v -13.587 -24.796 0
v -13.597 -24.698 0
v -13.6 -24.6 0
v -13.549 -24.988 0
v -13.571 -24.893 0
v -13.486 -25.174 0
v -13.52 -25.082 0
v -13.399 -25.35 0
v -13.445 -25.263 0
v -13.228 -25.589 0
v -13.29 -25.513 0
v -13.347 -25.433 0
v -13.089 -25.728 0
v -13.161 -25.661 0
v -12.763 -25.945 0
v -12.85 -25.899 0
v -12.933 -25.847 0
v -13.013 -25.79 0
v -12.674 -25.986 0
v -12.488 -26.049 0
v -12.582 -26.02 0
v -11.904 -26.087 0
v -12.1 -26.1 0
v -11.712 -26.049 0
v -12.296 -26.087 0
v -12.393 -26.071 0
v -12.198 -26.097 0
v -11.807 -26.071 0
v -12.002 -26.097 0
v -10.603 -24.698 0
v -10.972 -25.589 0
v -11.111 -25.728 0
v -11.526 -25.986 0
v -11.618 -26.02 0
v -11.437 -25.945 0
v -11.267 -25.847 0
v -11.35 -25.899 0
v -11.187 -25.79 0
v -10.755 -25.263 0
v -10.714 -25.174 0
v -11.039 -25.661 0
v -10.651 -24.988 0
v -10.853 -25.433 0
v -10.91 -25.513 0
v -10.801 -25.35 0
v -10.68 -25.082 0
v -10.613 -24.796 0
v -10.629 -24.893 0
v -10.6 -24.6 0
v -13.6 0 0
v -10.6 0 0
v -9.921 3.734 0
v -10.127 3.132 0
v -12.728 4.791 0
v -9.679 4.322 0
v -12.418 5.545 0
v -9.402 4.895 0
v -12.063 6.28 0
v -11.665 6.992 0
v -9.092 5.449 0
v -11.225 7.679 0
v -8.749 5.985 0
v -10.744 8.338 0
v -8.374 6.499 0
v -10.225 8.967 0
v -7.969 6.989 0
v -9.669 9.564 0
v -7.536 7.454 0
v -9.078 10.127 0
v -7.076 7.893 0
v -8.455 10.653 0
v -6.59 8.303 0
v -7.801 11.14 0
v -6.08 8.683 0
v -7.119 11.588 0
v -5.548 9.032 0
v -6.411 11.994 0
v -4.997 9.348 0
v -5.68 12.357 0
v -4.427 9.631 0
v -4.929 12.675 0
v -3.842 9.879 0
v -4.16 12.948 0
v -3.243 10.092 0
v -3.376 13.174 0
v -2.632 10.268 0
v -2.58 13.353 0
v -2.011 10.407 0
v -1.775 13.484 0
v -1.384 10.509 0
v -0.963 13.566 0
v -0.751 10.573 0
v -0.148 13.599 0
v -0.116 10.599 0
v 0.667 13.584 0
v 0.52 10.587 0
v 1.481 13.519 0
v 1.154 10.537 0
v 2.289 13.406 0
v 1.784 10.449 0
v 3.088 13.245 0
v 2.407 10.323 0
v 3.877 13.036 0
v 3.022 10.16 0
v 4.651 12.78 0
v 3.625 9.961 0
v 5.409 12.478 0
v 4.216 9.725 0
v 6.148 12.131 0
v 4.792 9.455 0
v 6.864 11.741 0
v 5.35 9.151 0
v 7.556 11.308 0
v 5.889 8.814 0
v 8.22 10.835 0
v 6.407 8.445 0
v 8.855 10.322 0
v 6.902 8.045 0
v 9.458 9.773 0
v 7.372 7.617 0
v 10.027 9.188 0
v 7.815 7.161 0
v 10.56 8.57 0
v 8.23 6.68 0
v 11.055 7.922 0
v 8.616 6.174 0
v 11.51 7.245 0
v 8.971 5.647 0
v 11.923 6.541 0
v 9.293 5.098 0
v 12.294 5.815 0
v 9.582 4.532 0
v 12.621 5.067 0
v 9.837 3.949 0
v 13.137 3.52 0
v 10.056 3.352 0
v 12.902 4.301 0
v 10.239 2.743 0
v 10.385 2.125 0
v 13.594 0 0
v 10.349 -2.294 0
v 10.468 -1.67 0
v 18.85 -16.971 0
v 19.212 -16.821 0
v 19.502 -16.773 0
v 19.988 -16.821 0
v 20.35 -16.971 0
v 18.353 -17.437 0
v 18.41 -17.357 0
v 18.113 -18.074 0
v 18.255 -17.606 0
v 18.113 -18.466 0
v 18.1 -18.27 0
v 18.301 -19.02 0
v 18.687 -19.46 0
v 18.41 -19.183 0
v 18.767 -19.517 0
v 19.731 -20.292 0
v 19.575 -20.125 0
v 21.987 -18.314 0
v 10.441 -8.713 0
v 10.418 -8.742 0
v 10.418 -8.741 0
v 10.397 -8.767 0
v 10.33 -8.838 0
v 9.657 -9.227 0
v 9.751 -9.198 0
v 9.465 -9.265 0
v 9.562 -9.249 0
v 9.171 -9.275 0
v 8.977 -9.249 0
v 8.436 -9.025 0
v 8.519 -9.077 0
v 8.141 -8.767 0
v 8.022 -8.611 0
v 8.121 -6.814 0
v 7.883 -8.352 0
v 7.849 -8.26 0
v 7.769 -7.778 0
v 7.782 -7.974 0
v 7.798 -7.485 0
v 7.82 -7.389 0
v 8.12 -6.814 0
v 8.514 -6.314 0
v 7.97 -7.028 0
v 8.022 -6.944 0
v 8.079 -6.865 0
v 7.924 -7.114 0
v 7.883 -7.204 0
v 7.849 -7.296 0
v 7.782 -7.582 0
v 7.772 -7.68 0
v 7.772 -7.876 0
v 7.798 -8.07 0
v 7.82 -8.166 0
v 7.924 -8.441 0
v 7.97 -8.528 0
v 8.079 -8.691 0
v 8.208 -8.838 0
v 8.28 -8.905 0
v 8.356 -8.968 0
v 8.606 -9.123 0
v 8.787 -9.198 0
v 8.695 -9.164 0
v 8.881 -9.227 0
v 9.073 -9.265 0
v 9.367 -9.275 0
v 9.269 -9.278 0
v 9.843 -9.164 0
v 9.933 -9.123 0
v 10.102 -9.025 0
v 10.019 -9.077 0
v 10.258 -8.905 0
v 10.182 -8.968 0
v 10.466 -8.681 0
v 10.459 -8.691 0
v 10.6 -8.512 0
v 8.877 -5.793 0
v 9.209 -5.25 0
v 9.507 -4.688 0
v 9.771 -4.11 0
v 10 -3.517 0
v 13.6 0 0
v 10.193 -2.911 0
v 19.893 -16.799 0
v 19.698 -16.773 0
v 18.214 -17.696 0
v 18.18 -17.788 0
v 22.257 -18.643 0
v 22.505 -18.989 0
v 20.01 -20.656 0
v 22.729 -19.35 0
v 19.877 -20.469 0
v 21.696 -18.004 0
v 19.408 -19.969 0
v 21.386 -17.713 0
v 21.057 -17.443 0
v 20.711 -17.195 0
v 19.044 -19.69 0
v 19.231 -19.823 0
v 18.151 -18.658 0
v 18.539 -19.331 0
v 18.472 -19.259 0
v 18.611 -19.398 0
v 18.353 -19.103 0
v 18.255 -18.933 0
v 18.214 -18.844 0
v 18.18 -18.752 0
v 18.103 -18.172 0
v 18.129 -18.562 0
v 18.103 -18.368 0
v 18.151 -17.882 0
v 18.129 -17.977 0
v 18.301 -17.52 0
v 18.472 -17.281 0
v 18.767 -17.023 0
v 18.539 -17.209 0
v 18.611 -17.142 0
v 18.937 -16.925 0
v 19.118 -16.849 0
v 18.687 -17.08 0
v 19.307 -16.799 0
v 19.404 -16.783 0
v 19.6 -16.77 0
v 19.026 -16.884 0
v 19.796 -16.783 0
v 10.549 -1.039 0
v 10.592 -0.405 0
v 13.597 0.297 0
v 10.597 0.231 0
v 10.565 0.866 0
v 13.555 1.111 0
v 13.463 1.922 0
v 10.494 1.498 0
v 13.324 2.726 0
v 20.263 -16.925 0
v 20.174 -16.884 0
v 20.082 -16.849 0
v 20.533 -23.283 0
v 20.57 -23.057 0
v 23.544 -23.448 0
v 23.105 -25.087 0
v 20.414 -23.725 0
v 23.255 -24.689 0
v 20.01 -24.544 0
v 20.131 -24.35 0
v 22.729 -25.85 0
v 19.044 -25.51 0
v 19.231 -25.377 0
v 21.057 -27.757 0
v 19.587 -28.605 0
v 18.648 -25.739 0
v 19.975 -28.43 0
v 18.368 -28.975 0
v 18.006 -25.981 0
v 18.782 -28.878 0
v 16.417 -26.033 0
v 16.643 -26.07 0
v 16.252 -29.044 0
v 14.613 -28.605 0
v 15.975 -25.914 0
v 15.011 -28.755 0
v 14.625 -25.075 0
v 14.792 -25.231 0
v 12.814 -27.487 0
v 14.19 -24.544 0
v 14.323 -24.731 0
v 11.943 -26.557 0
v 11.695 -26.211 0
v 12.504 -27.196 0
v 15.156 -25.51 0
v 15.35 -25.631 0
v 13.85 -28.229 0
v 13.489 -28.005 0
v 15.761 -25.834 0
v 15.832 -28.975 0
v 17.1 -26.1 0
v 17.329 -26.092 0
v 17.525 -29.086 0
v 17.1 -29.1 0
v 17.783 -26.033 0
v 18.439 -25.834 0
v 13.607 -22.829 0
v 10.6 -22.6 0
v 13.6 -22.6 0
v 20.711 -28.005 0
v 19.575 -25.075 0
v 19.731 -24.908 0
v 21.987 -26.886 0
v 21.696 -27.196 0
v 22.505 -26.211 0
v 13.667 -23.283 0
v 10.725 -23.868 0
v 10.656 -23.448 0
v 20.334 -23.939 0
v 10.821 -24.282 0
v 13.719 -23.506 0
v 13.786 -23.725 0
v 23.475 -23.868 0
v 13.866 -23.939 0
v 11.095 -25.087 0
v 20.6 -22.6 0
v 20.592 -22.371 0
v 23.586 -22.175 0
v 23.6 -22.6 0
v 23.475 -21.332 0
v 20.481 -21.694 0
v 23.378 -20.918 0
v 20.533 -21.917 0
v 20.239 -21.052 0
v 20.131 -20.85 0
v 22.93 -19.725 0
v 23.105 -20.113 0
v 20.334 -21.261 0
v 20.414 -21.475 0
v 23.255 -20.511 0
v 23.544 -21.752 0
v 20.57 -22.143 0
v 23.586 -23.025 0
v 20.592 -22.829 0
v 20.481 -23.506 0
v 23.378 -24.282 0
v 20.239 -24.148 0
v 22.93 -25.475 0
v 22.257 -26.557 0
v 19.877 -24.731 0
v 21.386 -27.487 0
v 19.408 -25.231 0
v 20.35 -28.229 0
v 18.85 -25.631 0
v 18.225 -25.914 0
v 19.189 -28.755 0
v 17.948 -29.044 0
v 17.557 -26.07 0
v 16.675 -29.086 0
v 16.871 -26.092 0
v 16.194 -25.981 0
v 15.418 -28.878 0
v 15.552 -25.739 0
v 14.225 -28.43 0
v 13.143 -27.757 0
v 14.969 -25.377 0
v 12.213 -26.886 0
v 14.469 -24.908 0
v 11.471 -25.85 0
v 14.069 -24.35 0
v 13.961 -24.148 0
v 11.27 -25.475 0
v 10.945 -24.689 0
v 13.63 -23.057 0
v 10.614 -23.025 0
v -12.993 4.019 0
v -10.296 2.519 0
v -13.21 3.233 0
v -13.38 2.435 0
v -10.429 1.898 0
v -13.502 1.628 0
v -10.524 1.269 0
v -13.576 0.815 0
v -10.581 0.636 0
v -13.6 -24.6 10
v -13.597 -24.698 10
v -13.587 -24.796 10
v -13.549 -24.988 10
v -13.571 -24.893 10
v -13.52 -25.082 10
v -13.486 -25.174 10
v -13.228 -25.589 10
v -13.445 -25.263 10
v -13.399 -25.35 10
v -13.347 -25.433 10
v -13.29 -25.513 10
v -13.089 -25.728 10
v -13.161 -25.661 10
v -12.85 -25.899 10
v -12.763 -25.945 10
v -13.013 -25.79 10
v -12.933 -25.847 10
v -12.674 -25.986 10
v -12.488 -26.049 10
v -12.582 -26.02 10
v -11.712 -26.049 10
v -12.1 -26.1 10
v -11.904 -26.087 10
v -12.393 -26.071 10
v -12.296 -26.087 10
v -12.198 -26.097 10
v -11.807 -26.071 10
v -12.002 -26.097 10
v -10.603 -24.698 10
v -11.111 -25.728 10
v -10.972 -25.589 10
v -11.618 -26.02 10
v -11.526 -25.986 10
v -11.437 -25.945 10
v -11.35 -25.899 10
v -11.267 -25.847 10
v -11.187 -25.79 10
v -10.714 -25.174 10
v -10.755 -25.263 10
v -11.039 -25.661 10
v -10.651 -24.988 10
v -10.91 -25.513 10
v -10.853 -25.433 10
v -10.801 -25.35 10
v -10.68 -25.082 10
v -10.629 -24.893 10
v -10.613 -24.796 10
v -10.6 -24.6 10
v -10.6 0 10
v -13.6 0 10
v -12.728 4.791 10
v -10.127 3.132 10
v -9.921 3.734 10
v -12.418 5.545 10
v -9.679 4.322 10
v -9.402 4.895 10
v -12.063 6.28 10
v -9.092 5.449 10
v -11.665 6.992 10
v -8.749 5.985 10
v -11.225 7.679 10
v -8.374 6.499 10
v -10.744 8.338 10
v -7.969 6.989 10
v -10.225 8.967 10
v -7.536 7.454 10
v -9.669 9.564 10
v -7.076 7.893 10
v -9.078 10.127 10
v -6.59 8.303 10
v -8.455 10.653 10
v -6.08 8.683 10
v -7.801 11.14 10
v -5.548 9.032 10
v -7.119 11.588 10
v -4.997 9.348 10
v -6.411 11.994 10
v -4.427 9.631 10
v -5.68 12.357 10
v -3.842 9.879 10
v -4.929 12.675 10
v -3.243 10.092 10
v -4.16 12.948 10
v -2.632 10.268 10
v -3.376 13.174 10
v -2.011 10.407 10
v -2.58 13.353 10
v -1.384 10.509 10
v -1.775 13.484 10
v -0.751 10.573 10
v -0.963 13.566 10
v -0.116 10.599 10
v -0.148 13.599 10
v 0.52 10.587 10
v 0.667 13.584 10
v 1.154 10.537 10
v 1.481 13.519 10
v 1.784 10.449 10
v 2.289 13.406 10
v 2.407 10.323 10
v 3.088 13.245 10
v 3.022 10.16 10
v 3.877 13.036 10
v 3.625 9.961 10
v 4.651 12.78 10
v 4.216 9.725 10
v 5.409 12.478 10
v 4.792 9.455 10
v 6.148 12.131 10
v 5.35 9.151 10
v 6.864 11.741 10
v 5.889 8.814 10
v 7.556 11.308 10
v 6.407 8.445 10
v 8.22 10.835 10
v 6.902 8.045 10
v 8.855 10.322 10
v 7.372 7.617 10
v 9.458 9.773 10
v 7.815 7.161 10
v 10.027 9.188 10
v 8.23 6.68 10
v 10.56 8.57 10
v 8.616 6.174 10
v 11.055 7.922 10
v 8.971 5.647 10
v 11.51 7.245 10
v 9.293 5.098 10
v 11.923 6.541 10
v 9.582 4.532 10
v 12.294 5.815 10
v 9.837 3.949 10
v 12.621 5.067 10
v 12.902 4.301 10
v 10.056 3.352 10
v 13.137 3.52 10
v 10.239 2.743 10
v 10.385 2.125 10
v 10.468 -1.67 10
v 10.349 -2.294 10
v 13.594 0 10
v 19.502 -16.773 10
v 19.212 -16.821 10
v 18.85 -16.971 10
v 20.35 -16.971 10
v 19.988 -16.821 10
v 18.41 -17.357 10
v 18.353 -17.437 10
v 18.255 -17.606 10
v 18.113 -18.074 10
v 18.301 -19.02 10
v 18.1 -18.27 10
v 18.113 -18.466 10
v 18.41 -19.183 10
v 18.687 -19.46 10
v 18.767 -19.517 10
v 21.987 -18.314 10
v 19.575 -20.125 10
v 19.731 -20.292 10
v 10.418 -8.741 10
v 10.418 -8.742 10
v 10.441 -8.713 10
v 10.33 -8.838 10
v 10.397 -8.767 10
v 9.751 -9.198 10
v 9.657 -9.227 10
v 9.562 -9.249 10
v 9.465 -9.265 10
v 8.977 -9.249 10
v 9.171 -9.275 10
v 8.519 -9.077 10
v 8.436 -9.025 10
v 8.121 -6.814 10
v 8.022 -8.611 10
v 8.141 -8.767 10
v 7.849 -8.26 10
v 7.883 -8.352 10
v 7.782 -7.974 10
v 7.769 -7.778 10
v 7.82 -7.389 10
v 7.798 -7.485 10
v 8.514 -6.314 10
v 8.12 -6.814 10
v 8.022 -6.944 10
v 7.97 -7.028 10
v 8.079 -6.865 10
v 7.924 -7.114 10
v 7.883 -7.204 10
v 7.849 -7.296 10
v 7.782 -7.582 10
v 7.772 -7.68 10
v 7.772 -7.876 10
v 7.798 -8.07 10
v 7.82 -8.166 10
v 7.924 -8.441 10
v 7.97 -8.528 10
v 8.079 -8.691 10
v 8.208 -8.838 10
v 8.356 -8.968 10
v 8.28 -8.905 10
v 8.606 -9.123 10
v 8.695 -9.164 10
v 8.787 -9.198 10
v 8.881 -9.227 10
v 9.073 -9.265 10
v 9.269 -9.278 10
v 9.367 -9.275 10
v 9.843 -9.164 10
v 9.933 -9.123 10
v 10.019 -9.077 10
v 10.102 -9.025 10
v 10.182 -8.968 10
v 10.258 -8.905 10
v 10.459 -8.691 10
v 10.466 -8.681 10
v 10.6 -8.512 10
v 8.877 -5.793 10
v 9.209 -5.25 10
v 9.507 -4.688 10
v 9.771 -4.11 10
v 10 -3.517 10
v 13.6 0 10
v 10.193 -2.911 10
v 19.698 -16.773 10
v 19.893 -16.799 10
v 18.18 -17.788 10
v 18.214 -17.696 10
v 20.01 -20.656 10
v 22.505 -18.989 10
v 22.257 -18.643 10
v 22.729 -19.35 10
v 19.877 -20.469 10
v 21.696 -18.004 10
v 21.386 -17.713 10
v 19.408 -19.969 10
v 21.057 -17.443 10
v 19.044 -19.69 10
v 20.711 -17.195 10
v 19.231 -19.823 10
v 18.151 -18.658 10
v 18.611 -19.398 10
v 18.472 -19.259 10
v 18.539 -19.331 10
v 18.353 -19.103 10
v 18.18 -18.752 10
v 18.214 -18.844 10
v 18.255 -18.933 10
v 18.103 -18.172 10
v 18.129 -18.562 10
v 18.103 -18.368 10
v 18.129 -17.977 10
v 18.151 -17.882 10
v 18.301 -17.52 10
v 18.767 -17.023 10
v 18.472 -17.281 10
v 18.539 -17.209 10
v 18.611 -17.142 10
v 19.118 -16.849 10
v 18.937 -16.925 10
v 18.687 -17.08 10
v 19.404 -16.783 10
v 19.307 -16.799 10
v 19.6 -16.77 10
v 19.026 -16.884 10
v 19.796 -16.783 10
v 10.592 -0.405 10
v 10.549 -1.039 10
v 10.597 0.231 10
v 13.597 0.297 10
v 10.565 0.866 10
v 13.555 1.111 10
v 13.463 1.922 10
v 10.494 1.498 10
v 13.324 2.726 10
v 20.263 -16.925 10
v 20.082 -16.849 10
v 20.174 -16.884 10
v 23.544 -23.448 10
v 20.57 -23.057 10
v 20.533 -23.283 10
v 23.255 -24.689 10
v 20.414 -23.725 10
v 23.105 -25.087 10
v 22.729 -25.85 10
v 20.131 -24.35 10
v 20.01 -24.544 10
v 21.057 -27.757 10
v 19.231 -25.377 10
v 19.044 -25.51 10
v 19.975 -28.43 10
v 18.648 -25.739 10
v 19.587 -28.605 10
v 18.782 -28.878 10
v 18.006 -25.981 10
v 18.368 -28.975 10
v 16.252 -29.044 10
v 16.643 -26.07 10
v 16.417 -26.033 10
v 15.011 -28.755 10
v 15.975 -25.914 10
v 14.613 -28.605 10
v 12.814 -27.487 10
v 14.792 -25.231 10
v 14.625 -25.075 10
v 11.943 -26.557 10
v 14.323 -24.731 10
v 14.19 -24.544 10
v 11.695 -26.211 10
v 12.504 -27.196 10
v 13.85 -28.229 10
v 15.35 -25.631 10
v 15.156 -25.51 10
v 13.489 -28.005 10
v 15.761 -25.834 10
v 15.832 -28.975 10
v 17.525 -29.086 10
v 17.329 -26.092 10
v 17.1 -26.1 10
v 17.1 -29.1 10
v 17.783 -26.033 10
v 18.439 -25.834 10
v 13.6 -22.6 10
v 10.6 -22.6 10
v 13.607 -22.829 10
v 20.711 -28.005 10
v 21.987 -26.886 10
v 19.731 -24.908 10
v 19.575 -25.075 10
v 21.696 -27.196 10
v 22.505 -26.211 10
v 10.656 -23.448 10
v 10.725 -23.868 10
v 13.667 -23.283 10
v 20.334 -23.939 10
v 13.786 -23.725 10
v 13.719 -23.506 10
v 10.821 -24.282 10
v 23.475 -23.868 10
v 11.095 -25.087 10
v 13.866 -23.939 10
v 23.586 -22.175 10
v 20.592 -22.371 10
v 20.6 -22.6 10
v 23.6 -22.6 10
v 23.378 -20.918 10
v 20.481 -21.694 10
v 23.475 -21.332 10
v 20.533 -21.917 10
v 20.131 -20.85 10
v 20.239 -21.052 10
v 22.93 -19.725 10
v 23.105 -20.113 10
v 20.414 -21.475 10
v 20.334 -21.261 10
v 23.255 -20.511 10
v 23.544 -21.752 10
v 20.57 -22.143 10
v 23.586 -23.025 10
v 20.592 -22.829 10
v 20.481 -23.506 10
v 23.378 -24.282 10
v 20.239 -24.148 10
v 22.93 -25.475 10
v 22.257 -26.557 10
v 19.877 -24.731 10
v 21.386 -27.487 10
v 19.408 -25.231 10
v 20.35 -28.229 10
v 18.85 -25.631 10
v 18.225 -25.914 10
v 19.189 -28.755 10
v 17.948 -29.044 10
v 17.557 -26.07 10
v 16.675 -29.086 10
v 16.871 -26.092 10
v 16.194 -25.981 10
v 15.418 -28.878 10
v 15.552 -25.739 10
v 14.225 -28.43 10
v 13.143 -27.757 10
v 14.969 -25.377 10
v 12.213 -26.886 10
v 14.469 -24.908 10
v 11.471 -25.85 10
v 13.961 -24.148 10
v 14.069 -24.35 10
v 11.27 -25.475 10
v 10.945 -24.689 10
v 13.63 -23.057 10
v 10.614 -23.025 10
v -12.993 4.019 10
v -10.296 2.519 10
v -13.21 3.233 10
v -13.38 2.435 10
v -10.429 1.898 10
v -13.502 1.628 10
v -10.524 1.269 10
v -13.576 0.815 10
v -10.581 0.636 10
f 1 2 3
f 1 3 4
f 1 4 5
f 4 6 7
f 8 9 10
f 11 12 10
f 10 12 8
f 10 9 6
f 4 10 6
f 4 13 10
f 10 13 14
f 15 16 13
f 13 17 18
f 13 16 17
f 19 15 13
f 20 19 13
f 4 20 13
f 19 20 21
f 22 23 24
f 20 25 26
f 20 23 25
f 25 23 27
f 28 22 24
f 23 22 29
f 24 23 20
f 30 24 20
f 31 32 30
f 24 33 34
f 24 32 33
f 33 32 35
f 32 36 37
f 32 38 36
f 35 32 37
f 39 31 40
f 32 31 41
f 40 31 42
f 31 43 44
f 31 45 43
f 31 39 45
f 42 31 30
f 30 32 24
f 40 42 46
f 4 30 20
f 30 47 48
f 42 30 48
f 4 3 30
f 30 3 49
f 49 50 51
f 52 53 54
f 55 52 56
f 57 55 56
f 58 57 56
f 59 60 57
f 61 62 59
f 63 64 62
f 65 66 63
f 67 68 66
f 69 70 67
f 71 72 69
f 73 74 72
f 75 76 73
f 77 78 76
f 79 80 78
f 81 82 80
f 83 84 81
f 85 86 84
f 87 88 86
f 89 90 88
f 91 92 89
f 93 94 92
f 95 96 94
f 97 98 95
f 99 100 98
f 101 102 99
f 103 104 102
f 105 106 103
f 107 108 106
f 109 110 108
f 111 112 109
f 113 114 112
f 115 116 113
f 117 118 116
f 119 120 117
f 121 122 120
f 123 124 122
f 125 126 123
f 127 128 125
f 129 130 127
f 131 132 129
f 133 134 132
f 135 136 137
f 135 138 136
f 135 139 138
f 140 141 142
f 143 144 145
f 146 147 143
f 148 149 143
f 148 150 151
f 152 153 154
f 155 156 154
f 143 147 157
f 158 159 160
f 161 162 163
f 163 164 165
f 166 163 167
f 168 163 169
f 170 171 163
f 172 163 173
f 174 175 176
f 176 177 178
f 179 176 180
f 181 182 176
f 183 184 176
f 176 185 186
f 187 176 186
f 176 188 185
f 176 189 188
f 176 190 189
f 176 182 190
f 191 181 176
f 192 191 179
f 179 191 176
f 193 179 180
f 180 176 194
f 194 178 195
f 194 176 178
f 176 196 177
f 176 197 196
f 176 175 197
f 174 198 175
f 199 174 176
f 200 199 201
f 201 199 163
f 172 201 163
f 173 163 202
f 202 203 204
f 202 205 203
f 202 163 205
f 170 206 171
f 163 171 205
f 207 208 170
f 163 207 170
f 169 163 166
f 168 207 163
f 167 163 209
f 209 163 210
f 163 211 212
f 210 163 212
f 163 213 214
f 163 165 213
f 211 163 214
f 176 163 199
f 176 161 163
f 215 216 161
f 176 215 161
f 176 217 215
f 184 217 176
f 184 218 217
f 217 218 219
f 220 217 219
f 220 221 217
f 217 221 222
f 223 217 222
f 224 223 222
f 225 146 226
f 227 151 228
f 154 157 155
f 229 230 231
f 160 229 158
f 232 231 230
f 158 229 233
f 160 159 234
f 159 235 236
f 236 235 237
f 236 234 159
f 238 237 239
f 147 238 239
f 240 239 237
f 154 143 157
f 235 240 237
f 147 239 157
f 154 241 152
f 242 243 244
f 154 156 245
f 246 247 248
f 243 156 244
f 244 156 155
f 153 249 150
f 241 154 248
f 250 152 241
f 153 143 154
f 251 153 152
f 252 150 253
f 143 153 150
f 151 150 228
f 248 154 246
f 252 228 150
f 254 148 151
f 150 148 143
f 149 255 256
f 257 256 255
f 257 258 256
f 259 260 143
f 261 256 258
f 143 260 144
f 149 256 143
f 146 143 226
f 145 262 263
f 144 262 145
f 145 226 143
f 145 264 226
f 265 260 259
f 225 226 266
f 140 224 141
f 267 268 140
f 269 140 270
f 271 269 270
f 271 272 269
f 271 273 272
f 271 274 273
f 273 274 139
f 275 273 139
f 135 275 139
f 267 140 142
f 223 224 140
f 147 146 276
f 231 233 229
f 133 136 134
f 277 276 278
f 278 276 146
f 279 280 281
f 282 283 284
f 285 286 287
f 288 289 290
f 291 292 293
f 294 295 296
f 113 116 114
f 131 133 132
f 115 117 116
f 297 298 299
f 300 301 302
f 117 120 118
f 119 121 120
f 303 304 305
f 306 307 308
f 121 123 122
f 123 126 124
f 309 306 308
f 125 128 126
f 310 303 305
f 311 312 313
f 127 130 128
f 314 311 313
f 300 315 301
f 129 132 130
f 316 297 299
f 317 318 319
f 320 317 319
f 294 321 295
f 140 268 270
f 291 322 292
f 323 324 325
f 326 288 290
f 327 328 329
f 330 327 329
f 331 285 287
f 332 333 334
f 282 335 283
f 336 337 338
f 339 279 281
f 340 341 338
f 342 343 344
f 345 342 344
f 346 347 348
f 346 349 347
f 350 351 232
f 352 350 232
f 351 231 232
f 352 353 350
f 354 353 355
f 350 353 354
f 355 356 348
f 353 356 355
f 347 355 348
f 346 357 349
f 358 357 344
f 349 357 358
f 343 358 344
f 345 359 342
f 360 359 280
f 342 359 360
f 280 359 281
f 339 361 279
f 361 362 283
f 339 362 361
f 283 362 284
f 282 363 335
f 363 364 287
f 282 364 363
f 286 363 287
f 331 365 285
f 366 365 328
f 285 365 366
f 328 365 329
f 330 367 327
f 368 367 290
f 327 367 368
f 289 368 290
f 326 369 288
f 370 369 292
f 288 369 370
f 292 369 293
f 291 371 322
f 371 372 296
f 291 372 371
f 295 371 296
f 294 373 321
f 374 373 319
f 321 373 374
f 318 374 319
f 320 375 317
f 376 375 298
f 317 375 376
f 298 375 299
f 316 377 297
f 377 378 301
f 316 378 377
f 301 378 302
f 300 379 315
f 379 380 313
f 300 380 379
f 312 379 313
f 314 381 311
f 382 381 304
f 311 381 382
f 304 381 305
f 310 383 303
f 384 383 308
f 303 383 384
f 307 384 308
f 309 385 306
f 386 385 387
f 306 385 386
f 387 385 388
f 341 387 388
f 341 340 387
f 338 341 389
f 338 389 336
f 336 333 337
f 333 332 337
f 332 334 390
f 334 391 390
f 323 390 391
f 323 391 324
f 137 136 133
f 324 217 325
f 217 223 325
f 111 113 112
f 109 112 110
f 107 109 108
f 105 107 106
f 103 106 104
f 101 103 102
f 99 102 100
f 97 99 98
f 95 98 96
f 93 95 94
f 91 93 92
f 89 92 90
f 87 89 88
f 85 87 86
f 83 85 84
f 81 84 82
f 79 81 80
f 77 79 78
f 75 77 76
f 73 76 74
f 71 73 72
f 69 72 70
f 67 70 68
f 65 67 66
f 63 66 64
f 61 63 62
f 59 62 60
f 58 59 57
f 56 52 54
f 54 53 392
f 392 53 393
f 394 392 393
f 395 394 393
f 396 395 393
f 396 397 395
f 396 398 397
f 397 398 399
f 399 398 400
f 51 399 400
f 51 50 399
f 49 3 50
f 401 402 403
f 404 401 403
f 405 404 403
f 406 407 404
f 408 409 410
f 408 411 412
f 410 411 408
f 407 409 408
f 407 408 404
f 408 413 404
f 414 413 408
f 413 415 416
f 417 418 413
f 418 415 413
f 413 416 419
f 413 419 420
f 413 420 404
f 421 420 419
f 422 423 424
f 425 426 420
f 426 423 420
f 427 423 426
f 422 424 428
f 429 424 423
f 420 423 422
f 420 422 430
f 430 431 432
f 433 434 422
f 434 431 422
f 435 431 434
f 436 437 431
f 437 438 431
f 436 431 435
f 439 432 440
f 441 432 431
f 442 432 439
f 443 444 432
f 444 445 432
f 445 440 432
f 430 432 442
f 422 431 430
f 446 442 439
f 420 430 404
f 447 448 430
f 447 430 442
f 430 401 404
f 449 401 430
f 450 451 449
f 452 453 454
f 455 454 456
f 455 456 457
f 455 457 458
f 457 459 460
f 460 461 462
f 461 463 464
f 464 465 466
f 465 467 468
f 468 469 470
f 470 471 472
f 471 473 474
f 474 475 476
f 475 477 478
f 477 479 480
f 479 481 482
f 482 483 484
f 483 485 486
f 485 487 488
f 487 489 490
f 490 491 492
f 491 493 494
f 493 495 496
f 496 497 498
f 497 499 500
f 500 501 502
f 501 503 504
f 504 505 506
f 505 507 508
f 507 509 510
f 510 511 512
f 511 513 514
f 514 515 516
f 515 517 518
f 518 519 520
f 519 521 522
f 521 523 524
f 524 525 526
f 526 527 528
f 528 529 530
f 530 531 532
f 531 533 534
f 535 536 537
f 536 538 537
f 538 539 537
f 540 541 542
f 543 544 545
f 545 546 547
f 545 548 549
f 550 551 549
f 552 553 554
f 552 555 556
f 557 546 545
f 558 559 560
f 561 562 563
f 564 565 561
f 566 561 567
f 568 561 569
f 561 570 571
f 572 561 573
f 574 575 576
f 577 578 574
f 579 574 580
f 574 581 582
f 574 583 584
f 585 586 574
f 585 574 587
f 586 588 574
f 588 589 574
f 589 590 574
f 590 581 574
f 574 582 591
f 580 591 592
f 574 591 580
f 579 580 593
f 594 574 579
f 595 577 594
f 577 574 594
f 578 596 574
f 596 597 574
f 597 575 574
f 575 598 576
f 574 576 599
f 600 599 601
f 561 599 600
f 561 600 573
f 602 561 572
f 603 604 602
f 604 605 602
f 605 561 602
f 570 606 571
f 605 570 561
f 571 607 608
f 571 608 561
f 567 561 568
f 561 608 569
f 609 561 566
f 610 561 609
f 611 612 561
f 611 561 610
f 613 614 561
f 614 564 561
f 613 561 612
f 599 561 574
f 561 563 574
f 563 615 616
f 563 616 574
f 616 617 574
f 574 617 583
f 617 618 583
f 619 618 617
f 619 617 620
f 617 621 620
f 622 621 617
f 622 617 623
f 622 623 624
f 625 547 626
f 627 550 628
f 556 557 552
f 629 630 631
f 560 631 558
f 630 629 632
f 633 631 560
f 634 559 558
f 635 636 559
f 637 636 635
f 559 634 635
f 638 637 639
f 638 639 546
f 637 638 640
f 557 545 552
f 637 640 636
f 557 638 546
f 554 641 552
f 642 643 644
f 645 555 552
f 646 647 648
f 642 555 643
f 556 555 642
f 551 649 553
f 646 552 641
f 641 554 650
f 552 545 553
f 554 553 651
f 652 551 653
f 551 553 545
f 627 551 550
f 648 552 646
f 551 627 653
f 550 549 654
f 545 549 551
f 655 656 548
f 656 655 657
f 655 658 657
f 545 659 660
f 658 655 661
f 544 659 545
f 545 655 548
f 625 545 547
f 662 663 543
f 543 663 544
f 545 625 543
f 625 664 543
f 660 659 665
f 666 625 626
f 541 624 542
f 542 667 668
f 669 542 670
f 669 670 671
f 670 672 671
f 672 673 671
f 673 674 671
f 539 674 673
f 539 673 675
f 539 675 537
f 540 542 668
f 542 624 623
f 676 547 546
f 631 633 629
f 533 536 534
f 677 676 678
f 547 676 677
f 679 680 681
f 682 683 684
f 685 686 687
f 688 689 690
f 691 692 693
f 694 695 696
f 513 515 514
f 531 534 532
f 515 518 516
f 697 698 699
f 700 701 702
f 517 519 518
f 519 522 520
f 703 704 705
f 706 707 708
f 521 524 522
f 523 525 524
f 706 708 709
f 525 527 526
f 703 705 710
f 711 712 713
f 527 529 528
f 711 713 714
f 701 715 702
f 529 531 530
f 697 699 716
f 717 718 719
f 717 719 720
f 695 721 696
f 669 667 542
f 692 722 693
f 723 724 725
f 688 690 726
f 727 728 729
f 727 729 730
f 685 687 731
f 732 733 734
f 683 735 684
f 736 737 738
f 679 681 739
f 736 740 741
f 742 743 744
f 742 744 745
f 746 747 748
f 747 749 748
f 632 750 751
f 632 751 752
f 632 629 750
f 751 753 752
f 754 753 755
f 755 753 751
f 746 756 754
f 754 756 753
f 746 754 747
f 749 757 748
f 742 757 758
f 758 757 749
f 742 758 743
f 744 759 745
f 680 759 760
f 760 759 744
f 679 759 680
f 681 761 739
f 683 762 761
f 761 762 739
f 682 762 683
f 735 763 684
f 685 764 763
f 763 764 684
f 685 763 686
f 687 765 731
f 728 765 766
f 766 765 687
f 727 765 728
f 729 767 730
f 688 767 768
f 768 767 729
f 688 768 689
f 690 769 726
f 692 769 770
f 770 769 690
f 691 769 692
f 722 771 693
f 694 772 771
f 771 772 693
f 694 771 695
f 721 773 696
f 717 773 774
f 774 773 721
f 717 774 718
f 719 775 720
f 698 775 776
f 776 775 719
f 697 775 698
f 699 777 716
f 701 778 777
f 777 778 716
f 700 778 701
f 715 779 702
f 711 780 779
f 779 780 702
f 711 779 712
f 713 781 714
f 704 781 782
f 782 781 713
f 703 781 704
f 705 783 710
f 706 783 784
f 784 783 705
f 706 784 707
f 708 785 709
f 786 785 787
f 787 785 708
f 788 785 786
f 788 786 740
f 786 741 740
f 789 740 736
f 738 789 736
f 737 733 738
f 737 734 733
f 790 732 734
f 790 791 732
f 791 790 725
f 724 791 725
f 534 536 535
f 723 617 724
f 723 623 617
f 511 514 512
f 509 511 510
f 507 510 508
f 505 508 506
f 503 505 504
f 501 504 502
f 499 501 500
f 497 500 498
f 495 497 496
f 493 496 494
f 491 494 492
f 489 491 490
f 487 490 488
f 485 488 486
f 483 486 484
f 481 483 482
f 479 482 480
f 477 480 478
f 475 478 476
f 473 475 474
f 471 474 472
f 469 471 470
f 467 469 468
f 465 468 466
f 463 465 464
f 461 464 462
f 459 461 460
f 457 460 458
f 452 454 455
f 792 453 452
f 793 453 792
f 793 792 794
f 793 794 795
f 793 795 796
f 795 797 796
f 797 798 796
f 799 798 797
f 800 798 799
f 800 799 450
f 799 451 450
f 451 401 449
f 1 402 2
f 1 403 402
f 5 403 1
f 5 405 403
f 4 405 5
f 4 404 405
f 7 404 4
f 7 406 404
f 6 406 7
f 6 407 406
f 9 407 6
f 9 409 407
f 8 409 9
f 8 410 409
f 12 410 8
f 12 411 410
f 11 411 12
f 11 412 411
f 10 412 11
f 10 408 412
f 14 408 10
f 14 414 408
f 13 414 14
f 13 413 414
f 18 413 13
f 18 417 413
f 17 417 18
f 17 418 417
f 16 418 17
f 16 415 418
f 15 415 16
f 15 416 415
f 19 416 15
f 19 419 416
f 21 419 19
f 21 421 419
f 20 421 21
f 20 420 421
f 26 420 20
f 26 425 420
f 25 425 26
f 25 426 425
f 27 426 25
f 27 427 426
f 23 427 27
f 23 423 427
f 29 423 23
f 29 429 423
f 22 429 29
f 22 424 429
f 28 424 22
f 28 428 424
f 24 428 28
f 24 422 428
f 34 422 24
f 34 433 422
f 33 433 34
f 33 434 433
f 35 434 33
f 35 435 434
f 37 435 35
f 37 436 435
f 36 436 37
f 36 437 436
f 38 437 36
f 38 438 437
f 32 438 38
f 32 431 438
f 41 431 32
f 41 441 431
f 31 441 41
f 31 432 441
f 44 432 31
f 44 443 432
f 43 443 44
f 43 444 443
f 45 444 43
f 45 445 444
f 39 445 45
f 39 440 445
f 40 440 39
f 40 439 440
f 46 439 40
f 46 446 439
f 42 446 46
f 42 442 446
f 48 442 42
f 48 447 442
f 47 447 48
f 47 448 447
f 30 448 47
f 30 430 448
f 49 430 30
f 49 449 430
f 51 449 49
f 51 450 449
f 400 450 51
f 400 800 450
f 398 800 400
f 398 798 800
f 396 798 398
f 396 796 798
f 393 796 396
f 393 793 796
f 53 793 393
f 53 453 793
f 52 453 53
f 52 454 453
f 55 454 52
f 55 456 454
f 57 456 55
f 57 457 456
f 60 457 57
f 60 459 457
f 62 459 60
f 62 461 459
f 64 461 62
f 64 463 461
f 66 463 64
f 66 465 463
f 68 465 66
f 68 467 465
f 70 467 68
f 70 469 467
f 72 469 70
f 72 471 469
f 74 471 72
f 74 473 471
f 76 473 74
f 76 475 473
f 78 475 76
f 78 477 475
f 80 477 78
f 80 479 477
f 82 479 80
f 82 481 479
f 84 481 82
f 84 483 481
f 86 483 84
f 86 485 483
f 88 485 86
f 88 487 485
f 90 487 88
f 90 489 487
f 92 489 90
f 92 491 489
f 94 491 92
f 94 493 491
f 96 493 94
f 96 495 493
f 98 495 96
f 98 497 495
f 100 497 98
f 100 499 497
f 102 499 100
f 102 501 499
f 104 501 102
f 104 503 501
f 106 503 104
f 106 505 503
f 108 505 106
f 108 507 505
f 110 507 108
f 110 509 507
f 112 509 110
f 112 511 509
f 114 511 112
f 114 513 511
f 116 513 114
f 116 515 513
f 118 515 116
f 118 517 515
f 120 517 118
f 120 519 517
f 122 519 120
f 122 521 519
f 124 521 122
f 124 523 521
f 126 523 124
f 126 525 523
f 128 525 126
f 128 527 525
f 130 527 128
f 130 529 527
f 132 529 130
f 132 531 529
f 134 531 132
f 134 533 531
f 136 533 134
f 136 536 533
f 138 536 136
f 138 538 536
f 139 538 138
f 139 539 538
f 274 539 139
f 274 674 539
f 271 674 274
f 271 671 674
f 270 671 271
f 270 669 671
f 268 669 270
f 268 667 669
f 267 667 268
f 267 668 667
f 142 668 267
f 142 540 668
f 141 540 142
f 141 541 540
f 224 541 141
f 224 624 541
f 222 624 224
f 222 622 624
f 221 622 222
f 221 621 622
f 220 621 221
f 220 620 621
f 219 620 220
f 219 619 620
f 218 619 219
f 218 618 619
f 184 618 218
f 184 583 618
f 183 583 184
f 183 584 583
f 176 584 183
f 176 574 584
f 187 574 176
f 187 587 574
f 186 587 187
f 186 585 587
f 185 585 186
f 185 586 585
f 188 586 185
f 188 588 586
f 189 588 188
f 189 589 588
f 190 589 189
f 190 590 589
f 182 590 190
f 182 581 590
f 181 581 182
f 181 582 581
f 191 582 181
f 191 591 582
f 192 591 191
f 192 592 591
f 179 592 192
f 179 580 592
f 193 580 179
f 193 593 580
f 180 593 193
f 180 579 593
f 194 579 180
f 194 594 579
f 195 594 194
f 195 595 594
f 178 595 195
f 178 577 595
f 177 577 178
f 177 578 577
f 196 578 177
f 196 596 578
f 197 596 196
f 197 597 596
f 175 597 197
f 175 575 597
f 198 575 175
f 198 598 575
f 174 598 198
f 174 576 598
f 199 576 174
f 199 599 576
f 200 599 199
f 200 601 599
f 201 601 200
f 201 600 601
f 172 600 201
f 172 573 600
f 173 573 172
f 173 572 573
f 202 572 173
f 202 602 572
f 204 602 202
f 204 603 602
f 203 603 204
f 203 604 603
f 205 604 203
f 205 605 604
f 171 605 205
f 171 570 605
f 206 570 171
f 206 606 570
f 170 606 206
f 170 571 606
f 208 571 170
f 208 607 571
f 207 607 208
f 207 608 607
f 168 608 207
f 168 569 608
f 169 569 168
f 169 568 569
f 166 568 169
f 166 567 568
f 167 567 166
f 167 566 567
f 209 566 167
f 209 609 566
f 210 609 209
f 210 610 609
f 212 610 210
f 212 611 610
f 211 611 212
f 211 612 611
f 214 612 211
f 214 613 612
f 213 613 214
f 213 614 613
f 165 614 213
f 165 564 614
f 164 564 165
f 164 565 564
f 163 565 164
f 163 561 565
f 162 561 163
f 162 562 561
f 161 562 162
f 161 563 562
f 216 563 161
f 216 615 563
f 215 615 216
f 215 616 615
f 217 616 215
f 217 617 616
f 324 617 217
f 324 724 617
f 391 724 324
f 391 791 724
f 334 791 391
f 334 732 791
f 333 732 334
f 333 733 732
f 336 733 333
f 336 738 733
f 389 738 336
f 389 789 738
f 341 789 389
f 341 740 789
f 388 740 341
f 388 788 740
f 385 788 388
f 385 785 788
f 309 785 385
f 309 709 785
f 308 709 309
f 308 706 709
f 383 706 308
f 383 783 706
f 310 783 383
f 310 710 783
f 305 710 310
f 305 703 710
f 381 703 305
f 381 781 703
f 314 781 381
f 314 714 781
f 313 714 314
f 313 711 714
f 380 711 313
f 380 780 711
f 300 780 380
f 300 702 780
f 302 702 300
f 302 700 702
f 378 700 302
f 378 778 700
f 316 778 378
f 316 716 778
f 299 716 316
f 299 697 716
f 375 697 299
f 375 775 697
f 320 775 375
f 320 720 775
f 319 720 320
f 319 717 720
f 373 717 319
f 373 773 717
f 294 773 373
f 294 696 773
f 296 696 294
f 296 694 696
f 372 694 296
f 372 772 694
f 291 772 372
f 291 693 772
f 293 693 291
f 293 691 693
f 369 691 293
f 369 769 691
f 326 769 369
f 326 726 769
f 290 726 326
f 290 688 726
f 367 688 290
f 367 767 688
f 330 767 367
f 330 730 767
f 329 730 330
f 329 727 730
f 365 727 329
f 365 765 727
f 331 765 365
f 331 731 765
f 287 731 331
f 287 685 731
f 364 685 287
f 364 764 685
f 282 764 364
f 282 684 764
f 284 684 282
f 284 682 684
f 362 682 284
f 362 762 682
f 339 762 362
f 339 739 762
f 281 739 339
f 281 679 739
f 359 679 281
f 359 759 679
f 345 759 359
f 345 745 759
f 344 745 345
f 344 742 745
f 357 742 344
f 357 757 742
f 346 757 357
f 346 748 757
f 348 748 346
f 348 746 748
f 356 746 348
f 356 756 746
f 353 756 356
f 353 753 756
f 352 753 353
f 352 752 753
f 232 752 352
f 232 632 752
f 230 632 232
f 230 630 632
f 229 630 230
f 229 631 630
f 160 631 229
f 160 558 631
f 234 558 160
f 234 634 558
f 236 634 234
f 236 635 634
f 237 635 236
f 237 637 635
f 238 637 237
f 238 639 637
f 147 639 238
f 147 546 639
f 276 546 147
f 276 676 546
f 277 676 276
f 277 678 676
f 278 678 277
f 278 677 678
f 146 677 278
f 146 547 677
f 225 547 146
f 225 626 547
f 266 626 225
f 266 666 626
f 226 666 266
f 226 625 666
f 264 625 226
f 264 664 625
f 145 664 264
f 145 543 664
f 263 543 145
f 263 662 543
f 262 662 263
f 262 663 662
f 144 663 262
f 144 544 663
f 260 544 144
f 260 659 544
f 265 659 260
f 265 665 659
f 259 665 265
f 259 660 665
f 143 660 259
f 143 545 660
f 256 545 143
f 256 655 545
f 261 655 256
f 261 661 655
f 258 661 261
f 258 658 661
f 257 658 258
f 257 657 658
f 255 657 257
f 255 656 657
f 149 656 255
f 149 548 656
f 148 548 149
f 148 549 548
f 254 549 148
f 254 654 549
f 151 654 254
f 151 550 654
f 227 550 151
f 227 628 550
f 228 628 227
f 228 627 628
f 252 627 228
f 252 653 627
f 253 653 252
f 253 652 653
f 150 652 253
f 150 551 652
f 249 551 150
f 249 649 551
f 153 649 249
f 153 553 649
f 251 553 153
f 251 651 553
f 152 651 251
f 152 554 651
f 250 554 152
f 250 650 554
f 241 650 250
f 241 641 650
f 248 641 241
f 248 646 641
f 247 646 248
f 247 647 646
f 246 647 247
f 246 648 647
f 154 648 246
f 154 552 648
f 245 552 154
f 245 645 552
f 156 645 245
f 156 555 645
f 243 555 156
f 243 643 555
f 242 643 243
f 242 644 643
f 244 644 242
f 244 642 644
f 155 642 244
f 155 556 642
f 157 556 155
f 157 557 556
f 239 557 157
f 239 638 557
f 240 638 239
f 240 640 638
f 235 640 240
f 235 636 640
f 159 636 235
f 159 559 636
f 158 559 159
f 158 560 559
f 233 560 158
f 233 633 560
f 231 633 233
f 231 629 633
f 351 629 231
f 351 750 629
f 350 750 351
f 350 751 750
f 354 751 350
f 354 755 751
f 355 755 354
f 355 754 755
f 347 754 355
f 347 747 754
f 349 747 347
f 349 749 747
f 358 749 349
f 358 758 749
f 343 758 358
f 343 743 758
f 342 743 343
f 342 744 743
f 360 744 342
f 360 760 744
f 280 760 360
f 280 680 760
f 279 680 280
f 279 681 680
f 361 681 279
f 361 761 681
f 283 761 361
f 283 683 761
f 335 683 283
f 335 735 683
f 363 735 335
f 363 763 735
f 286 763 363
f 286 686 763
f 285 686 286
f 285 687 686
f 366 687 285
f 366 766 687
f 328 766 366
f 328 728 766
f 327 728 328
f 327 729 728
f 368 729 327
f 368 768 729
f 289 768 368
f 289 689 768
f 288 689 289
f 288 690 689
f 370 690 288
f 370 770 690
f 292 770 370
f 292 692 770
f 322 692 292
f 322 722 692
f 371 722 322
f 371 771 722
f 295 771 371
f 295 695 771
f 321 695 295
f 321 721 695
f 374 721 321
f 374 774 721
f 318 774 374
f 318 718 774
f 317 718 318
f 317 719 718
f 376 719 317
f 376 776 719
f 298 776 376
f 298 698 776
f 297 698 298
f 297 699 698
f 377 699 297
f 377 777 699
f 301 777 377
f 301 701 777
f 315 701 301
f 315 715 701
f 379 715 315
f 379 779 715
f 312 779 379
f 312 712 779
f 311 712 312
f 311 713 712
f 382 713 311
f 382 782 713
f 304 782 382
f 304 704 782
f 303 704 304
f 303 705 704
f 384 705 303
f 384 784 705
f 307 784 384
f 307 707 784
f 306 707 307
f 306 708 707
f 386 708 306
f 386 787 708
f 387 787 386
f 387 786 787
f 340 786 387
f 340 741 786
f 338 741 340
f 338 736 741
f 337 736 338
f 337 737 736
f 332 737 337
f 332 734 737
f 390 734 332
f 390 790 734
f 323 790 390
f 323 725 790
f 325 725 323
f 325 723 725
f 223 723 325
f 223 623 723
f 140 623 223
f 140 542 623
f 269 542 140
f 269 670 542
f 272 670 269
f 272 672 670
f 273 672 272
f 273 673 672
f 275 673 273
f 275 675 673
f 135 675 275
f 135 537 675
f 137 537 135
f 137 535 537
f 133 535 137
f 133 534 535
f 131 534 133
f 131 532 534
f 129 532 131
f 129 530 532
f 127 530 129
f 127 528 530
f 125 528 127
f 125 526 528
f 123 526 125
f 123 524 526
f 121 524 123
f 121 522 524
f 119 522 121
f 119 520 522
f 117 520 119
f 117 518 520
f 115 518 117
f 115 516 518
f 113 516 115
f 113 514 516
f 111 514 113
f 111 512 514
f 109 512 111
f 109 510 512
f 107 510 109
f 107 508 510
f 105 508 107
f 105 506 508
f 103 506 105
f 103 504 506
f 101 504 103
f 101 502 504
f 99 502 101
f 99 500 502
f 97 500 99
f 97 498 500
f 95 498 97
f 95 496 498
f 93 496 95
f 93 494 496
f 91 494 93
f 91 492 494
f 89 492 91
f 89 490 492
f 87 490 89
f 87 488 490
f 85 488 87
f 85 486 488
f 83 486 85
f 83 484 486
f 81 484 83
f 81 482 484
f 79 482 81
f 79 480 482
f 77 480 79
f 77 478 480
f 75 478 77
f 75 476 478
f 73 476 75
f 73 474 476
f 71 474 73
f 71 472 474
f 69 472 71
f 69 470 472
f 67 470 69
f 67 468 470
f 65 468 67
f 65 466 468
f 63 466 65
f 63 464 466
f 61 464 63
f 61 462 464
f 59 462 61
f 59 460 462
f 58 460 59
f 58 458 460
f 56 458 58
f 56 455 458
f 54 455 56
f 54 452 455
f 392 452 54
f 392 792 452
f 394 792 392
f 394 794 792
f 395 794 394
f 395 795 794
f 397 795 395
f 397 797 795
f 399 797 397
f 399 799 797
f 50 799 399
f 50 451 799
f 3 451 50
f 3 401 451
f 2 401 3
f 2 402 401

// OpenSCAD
// =====================================================================
//  Haken fuer Weihnachts-LED-Lichterketten
//  - Dachrinnen-Haken (halbrunde Rinne mit Wulst / Bordel)
//  - Wandhaken zum Schrauben (Holz, Fassade mit Duebel)
//  - Wandhaken zum Kleben (Fassade, Fensterrahmen ...)
//
//  Parametrisch: Werte unten anpassen oder per Kommandozeile, z.B.
//    openscad -D 'teil="rinne"' -D wulst_d=20 -o haken.stl haken.scad
//  Alle Masse in mm.
// =====================================================================

/* [Auswahl] */
// Welches Teil soll erzeugt werden?
teil = "rinne"; // [rinne, schraube, kleben, alle]

/* [Dachrinnen-Haken] */
// Durchmesser des Rinnenwulstes (vorne an der Rinne) - mit Messschieber messen!
wulst_d   = 20;
// Spiel zwischen Wulst und Haken
spiel     = 0.6;
// Wie weit der Haken vorne unter den Wulst greift (Grad, mehr = fester)
untergriff = 40;
// Laenge des Beins, das innen in der Rinne haengt (unter Wulstmitte)
bein_innen = 14;
// Wie weit die Lichterkette unter dem Wulst haengt (unter Unterkante Wulst)
abhang     = 12;

/* [Wandhaken] */
// Groesse der Grundplatte (Breite x Hoehe)
platte_b  = 24;
platte_h  = 40;
// Dicke der Grundplatte
platte_t  = 4;
// Abstand Kabelauflage von der Wand
arm_l     = 14;
// Hoehe der vorderen Lippe ueber dem Arm
lippe_h   = 5;
// Schraubenloch (fuer 3,5-4 mm Holzschrauben bzw. 4 mm Schraube im Duebel)
loch_d    = 4.5;
// Senkkopf-Durchmesser
senk_d    = 8.6;

/* [Allgemein] */
// Materialstaerke der Haken
t         = 3;
// Breite (Druckhoehe) des Dachrinnen-Hakens
breite    = 10;
// Radius der Kabelaufnahme (3.5 = Kabel bis ca. 6 mm)
kabel_r   = 3.5;
// Winkel, bis zu dem sich die Kabelaufnahme schliesst (groesser = haelt fester)
haken_ende = 60;

$fn = 96;

// ---------------------------------------------------------------------
//  Hilfsfunktionen
// ---------------------------------------------------------------------
function bogen(r, a0, a1, n = 64) =
    [for (i = [0 : n]) let (a = a0 + (a1 - a0) * i / n) [r * cos(a), r * sin(a)]];

// Kreisring-Segment mit abgerundeten Enden
module ring_seg(c, ri, ro, a0, a1) {
    rm = (ri + ro) / 2;
    tw = ro - ri;
    translate(c) {
        polygon(concat(bogen(ro, a0, a1), bogen(ri, a1, a0)));
        for (a = [a0, a1]) translate([rm * cos(a), rm * sin(a)]) circle(d = tw);
    }
}

// J-foermige Kabelaufnahme; Rueckwand liegt bei x = x_wand, Grund bei y = y_grund
module kabel_haken(x_wand, y_mitte) {
    ring_seg([x_wand + kabel_r, y_mitte], kabel_r, kabel_r + t, 180, 360 + haken_ende);
}

// ---------------------------------------------------------------------
//  1) Dachrinnen-Haken  (Profil liegt flach auf dem Druckbett)
//     Ursprung = Mitte des Wulstes, +x = nach vorne (weg vom Haus)
// ---------------------------------------------------------------------
module rinne_profil() {
    R    = wulst_d / 2 + spiel;
    tief = R + abhang;                       // Hoehe Kabelaufnahme unter Wulstmitte
    union() {
        // Buegel ueber den Wulst: von innen (hinten) ueber oben nach vorne und darunter
        ring_seg([0, 0], R, R + t, -untergriff, 180);
        // Bein innen in der Rinne (stuetzt sich an der Rinnenwand ab -> kein Verdrehen)
        translate([-(R + t), -(R + bein_innen)]) square([t, R + bein_innen]);
        translate([-(R + t / 2), -(R + bein_innen)]) circle(d = t);
        // Steg vorne nach unten
        translate([R, -tief]) square([t, tief]);
        // Kabelaufnahme
        kabel_haken(R + t, -tief);
    }
}

module rinnen_haken() {
    linear_extrude(height = breite) rinne_profil();
}

// ---------------------------------------------------------------------
//  2/3) Wandhaken  (Grundplatte liegt flach auf dem Bett = glatte Seite
//       an die Wand, ideal fuer Klebeband)
//       Koordinaten: x = Breite, y = Hoehe an der Wand (oben = +y), z = von Wand weg
// ---------------------------------------------------------------------
module wandhaken(mit_loch) {
    l      = arm_l + t;                         // Arm-Laenge von Plattenoberseite
    arm_y  = mit_loch ? 6 : (platte_h - t) / 2; // Lage des Arms auf der Platte
    loch_y = platte_h - 9;
    difference() {
        union() {
            // Grundplatte mit abgerundeten Ecken
            linear_extrude(height = platte_t)
                offset(r = 3) offset(delta = -3) square([platte_b, platte_h]);

            // Arm + Lippe als extrudiertes Seitenprofil (in y-z-Ebene)
            translate([0, arm_y, platte_t])
                rotate([90, 0, 90]) linear_extrude(height = platte_b)
                    polygon([
                        // y (an der Wand nach oben), z (von der Wand weg)
                        [-2.5, 0],                    // Hohlkehle unten
                        [t + 2.5, 0],                 // Hohlkehle oben
                        [t, 2.5],
                        [t, l - t - lippe_h],         // Kabelauflage (Oberseite Arm)
                        [t + lippe_h, l - t],         // 45-Grad-Fase unter der Lippe
                        [t + lippe_h, l],             // Lippe vorne
                        [0, l],
                        [0, 2.5]
                    ]);
        }
        if (mit_loch) {
            // Durchgangsloch + Senkung (Senkung auf der Vorderseite = oben im Druck)
            translate([platte_b / 2, loch_y, -1]) cylinder(d = loch_d, h = platte_t + 2);
            translate([platte_b / 2, loch_y, platte_t - (senk_d - loch_d) / 2])
                cylinder(d1 = loch_d, d2 = senk_d + 0.01, h = (senk_d - loch_d) / 2 + 0.01);
        }
    }
}

// ---------------------------------------------------------------------
//  Ausgabe
// ---------------------------------------------------------------------
if (teil != "keins" && teil == "rinne")    rinnen_haken();
if (teil != "keins" && teil == "schraube") wandhaken(true);
if (teil != "keins" && teil == "kleben")   wandhaken(false);
if (teil != "keins" && teil == "alle") {
    rinnen_haken();
    translate([45, -20, 0]) wandhaken(true);
    translate([80, -20, 0]) wandhaken(false);
}
